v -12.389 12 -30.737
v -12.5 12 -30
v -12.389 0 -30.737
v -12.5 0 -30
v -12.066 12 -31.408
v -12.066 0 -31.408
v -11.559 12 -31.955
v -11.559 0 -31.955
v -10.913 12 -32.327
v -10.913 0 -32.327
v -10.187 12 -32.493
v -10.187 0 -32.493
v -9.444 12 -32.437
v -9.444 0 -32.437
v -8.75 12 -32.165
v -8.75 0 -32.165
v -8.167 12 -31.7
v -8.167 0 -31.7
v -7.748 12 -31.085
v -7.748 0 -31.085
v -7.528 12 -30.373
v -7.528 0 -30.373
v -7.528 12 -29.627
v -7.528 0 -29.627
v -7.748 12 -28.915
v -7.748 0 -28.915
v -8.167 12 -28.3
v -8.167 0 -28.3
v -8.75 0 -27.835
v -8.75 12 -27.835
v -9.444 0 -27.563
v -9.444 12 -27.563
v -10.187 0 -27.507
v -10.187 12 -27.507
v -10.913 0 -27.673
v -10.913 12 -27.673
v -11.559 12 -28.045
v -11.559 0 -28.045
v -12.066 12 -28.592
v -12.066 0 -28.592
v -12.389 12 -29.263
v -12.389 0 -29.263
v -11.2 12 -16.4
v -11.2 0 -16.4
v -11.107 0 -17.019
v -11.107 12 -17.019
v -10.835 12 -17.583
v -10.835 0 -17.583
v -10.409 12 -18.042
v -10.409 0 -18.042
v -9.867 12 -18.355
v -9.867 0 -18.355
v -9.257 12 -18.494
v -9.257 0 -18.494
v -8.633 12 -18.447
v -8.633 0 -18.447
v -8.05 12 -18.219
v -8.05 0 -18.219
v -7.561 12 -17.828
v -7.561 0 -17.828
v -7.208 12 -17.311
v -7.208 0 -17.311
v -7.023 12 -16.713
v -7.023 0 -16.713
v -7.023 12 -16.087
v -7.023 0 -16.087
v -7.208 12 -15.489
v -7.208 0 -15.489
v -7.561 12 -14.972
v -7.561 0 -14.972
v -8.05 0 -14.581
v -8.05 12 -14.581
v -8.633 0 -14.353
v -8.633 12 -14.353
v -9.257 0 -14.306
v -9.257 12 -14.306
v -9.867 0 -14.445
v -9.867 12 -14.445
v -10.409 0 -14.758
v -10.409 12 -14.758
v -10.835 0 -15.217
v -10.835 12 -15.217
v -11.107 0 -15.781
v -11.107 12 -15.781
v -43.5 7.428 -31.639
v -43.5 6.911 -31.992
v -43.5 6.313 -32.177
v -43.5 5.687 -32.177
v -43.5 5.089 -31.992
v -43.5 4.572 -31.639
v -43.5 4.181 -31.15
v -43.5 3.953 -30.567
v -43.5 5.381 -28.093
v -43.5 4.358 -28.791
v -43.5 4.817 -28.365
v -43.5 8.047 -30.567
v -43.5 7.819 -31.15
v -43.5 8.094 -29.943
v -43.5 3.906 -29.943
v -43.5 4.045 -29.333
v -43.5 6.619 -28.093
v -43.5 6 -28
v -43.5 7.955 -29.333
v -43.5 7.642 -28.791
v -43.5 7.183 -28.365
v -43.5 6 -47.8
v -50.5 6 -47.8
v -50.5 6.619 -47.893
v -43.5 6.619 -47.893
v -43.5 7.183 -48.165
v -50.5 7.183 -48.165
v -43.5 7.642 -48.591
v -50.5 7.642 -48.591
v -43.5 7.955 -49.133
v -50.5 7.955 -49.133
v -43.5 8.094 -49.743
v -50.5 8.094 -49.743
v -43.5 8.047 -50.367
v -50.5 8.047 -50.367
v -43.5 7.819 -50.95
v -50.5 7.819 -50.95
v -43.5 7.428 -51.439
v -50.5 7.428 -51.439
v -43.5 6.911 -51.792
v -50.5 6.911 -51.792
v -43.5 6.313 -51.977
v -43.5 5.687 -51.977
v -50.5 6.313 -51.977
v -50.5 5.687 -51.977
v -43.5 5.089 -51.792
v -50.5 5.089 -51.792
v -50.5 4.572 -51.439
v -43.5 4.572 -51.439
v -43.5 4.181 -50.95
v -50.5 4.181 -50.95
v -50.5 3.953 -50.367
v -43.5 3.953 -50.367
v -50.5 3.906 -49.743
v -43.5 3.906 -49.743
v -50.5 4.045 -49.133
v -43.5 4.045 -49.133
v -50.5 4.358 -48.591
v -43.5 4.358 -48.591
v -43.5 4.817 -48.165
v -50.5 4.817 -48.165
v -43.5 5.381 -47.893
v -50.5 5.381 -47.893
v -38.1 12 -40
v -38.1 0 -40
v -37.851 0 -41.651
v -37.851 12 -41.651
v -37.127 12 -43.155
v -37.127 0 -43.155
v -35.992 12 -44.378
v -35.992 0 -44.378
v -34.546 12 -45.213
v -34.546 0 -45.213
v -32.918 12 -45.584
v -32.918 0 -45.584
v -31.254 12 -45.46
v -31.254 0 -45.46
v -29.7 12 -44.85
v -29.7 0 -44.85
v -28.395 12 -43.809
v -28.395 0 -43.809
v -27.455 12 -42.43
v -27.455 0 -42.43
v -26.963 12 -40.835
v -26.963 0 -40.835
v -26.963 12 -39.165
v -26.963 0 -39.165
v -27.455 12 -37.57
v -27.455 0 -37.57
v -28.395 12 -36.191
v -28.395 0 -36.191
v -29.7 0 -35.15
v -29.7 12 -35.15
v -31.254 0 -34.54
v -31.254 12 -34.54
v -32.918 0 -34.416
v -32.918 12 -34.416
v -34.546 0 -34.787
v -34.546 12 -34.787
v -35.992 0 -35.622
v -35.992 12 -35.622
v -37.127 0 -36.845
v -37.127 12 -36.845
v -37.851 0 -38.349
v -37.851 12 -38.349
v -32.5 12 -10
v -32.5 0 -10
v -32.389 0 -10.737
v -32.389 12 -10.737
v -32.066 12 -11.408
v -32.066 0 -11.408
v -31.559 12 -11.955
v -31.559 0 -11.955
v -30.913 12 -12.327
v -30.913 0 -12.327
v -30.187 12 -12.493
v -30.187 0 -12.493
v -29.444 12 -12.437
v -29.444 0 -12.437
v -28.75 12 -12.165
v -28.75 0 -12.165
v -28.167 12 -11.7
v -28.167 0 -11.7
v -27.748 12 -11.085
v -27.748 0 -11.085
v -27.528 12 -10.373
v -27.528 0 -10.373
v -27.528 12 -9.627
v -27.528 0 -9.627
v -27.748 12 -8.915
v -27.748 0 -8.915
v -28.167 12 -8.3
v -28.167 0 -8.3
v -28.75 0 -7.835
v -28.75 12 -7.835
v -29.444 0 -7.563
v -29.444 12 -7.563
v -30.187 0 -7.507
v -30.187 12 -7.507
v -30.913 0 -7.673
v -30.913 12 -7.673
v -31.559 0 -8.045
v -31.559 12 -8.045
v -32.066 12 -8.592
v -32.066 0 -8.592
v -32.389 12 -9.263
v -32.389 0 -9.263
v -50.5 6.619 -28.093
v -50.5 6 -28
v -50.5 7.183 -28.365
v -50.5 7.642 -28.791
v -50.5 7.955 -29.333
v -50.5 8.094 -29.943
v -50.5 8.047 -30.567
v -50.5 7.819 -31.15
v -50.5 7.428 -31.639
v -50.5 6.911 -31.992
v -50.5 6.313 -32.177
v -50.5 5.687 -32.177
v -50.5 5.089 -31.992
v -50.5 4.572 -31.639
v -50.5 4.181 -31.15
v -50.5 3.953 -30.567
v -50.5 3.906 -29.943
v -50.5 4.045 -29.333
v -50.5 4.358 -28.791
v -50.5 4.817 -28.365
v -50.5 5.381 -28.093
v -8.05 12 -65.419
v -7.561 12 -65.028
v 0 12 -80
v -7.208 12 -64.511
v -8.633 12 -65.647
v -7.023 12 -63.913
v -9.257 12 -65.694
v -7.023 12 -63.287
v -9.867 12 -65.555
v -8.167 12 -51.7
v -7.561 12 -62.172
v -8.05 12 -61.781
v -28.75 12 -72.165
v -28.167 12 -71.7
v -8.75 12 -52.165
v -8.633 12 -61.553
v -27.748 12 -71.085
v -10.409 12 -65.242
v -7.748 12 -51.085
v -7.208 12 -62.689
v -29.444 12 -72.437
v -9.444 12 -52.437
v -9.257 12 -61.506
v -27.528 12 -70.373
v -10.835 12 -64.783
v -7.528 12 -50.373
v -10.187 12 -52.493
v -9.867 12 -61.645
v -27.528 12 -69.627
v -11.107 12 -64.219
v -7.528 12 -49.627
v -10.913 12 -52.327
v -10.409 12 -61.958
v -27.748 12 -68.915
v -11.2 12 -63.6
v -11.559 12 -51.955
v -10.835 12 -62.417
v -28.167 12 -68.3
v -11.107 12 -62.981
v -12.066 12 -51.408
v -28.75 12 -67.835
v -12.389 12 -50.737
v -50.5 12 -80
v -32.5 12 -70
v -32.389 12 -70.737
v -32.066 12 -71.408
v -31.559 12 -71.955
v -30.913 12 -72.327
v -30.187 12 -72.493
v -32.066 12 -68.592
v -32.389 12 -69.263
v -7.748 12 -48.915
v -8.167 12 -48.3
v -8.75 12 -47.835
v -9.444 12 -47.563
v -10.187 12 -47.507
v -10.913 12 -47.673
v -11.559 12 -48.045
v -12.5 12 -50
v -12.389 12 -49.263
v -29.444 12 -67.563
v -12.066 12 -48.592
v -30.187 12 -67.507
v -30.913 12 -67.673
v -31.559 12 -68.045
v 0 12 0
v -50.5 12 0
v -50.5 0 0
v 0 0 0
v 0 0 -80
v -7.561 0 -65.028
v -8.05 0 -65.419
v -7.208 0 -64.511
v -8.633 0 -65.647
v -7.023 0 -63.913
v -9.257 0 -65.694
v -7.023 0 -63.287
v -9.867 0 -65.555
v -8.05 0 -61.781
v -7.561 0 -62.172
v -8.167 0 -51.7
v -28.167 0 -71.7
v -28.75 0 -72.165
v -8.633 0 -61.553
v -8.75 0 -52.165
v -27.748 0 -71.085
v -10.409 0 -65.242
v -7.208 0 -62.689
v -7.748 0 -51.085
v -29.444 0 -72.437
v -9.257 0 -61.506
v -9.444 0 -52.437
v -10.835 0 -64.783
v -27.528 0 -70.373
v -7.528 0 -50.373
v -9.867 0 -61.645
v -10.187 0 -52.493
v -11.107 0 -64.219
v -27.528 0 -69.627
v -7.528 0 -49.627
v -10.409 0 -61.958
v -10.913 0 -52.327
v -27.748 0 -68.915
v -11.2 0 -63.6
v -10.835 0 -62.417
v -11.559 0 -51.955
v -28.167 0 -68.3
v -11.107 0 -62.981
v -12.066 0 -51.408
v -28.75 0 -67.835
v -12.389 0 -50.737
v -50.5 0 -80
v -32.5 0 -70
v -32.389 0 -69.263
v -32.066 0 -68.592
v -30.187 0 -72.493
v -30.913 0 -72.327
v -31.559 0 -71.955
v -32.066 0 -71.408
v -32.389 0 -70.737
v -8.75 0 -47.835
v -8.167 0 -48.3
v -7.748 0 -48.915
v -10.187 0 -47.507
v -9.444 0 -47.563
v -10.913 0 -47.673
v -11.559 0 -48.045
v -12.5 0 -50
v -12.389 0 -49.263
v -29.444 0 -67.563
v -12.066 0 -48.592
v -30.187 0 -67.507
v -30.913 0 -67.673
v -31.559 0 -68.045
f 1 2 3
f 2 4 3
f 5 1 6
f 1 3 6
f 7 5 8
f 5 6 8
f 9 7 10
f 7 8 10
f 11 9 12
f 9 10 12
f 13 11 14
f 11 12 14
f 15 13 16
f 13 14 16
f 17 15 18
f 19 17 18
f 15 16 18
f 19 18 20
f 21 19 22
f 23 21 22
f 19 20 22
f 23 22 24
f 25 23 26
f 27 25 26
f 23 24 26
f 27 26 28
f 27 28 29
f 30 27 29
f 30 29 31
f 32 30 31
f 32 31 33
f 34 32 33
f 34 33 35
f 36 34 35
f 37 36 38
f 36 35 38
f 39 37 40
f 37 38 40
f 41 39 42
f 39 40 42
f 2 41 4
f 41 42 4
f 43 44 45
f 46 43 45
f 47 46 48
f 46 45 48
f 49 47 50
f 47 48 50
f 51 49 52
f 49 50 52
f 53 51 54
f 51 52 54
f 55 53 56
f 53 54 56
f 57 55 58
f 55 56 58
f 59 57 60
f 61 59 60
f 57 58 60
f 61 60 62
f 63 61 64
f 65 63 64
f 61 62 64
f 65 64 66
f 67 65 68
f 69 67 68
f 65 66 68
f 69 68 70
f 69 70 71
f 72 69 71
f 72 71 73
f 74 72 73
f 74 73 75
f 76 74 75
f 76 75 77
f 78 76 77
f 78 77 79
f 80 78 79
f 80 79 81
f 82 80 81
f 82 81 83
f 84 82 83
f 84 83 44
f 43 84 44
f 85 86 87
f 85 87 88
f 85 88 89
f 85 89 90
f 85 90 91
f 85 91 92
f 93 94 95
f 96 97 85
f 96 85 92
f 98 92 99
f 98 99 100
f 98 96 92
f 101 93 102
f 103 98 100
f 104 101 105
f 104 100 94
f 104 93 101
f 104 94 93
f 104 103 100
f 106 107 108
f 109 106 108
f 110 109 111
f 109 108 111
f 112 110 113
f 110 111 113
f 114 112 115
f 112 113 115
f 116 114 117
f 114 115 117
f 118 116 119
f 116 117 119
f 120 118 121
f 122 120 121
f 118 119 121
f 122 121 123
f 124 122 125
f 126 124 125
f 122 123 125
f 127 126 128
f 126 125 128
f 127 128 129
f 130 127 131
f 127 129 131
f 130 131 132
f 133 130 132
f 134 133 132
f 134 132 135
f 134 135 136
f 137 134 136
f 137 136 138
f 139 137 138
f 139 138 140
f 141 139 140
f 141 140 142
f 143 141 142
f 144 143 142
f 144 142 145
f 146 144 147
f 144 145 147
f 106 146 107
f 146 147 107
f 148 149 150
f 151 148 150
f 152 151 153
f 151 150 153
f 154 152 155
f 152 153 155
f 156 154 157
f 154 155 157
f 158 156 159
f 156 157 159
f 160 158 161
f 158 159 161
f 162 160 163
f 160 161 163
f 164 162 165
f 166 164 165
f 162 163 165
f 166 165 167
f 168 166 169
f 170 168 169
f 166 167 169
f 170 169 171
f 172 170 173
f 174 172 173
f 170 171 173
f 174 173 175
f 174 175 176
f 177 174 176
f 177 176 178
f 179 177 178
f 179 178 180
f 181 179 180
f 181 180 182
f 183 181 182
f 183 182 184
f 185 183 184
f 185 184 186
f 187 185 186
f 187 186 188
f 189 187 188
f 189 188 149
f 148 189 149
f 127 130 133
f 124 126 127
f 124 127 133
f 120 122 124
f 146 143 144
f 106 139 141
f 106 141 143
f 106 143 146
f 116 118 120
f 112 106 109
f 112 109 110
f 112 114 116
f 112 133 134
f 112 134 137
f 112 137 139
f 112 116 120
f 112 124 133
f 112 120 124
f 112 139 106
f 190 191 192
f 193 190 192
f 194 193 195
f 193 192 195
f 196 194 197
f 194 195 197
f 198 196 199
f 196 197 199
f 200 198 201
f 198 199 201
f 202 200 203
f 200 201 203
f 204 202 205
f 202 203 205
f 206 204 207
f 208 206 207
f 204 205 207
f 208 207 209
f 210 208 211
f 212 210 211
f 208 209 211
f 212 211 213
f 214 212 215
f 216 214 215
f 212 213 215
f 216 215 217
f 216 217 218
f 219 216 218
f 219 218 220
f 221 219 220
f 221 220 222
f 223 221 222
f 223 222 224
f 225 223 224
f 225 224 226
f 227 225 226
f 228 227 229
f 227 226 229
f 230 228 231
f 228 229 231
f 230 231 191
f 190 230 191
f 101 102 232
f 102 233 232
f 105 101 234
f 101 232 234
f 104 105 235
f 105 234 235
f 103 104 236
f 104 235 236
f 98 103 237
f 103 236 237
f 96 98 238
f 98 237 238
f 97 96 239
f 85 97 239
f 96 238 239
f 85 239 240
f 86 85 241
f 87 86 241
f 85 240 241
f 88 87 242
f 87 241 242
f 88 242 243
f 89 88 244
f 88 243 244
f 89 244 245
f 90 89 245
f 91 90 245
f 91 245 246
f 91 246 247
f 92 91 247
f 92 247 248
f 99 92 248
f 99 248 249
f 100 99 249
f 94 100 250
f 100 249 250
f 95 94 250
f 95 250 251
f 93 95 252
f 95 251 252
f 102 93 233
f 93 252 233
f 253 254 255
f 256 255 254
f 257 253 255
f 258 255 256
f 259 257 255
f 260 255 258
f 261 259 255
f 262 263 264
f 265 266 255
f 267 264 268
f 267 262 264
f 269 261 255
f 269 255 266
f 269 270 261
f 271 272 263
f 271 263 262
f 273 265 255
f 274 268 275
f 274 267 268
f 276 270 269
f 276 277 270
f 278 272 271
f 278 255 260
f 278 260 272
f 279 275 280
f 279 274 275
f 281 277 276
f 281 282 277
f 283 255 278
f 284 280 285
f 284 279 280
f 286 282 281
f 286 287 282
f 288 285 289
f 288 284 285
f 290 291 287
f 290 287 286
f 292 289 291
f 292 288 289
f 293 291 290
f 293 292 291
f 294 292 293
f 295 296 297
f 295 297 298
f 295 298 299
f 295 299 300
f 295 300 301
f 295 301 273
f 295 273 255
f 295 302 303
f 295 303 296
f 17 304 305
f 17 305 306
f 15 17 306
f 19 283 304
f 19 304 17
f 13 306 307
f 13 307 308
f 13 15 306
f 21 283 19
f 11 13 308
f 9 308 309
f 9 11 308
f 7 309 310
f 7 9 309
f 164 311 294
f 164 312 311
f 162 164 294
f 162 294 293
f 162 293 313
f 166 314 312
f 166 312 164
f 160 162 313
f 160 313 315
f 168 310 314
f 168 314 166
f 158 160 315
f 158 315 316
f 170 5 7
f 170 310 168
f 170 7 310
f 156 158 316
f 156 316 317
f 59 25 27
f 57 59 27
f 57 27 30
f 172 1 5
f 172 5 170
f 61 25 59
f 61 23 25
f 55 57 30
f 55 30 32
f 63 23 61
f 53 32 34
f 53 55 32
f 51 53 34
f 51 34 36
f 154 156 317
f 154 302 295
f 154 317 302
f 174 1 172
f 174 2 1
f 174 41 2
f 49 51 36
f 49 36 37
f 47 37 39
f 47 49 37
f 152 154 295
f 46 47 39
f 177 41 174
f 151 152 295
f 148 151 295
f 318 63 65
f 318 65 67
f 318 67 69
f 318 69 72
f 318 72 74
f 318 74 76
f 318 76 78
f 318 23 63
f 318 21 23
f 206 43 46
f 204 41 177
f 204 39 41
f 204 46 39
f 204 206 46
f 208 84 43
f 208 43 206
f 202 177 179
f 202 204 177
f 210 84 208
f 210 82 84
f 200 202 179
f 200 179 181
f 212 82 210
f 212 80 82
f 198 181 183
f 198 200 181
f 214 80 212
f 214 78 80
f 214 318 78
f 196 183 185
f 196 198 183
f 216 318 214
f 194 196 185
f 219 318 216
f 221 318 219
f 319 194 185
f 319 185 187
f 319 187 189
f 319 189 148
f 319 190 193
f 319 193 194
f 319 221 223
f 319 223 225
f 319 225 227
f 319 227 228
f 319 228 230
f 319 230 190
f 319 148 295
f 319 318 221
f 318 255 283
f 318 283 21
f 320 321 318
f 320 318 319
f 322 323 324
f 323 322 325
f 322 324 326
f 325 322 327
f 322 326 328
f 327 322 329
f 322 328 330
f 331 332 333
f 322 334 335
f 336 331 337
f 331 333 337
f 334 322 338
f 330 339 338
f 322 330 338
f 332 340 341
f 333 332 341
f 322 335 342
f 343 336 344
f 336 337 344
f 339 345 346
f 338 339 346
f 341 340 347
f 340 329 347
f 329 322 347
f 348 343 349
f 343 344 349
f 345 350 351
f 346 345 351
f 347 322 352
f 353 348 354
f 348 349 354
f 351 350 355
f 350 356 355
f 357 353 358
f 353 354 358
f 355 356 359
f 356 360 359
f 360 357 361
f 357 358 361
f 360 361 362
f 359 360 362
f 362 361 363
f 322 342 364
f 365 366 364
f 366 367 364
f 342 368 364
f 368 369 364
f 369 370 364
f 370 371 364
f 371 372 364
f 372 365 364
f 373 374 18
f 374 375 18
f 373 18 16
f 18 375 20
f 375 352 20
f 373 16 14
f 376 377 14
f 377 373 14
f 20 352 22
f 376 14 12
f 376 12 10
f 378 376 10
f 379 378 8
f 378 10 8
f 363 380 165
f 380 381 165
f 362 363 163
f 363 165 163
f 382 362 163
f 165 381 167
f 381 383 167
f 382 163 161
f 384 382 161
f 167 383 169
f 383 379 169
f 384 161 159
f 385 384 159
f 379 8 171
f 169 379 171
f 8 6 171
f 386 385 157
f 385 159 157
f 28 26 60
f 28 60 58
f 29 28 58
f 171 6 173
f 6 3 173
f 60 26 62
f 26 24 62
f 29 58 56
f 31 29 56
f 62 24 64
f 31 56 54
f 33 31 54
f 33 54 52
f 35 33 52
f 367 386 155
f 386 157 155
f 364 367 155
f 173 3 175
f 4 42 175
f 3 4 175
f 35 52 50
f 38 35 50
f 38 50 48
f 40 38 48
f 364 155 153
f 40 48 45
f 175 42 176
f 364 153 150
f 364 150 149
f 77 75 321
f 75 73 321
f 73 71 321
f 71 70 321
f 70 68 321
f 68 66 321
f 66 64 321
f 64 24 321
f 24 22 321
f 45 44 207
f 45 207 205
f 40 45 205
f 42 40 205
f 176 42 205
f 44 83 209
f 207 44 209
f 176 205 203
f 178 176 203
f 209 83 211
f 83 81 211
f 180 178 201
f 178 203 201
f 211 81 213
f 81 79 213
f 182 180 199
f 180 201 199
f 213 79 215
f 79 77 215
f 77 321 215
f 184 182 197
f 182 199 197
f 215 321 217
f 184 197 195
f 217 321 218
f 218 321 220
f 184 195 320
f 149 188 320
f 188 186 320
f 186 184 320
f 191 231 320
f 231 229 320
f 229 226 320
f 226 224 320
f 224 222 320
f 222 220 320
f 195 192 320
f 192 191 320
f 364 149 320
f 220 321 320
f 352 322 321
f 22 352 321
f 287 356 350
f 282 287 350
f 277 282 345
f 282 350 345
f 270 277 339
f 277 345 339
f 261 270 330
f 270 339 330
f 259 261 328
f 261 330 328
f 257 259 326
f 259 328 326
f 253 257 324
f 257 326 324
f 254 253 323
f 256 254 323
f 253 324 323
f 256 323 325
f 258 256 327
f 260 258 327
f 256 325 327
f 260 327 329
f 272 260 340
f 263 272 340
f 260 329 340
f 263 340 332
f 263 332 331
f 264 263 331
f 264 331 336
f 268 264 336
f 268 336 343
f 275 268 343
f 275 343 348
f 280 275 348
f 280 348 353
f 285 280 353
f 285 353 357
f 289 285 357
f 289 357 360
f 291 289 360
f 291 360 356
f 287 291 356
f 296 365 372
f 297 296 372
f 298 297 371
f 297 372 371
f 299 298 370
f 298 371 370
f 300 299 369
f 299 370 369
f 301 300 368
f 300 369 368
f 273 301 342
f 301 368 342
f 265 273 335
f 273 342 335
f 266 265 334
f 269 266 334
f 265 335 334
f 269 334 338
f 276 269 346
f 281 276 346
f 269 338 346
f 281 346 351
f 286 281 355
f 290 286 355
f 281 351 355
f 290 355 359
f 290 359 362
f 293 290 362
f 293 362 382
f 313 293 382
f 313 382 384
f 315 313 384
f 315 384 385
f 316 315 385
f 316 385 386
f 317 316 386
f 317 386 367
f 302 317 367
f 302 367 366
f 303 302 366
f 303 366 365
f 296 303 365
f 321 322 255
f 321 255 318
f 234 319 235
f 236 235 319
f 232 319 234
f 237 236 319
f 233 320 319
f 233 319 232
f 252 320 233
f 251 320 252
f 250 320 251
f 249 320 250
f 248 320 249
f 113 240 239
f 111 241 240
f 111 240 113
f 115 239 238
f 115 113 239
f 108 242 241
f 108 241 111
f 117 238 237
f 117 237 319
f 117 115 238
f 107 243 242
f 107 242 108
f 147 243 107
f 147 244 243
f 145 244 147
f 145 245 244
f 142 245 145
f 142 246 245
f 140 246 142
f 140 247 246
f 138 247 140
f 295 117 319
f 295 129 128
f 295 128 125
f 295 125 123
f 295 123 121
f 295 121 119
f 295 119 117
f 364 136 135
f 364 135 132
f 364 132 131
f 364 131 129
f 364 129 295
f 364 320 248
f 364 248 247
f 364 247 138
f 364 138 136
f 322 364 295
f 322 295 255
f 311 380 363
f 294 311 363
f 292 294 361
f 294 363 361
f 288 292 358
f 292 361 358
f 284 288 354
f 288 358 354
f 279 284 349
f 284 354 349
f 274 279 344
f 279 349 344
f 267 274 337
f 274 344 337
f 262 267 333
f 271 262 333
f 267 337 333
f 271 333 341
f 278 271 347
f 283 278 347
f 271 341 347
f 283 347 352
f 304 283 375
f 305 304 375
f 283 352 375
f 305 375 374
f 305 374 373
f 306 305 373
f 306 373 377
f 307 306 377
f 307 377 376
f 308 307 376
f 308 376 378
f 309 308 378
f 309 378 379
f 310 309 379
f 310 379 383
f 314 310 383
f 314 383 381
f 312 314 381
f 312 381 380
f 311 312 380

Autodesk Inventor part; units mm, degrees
ref_plane "YZ Plane" through (0, 0, 0) normal (1, 0, 0) x (0, 1, 0)
ref_plane "XZ Plane" through (0, 0, 0) normal (0, 1, 0) x (-1, 0, 0)
ref_plane "XY Plane" through (0, 0, 0) normal (0, 0, 1) x (1, 0, 0)
sketch "Sketch1" plane through (0, 0, 0) normal (0, 1, 0) x (-1, 0, 0)
  line L0 (0, 0) -> (50.5, 0)
  line L1 (50.5, 0) -> (50.5, -80)
  line L2 (50.5, -80) -> (0, -80)
  line L3 (0, -80) -> (0, 0)
  line L4 (0, -80) -> (9.1, -80)
  line L5 (0, -80) -> (10, -80)
  line L6 (10, -80) -> (10, -50)
  circle A0 centre (10, -30) radius 2.5
  circle A1 centre (10, -50) radius 2.5
  line L7 (9.1, -65.7) -> (9.1, -63.6)
  circle A2 centre (9.1, -16.4) radius 2.1
  circle A3 centre (9.1, -63.6) radius 2.1
  line L8 (0, 0) -> (0, -40)
  line L9 (9.1, -40) -> (32.5, -40)
  circle A4 centre (32.5, -40) radius 5.6
  line L10 (0, 0) -> (0, -10)
  line L11 (30, -10) -> (30, -70)
  circle A5 centre (30, -10) radius 2.5
  circle A6 centre (30, -70) radius 2.5
  line L12 (27.5, -10) -> (30, -10)
  line L13 (9.1, 0) -> (9.1, -10)
  line L14 (9.1, -14.3) -> (9.1, -16.4)
  line L15 (9.1, -10) -> (9.1, 0)
  line L16 (9.1, -18.5) -> (9.1, -14.3)
  line L17 (10, -18.2974) -> (10, -14.5026)
  line L18 (10, -50) -> (10, -47.5)
  line L19 (10, -32.5) -> (10, -30)
  line L20 (9.1, -32.3324) -> (9.1, -27.6676)
  line L21 (10, -80) -> (10, -47.5)
  line L22 (10, -40) -> (10, -27.5)
  line L23 (9.1, -65.7) -> (9.1, -61.5)
  line L24 (9.1, -52.3324) -> (9.1, -47.6676)
  dimension "d17" = 5
  dimension "d0" = 50.5
  dimension "d1" = 80
  dimension "d2" = 9.1
  dimension "d3" = 10
  dimension "d4" = 30
  dimension "d5" = 20
  dimension "d6" = 5
  dimension "d7" = 5
  dimension "d8" = 16.4
  dimension "d9" = 16.4
  dimension "d10" = 4.2
  dimension "d11" = 4.2
  dimension "d12" = 32.5
  dimension "d13" = 11.2
  dimension "d14" = 10
  dimension "d15" = 30
  dimension "d16" = 60
  dimension "d27" = 47.2
extrude "Extrusion1" add sketch "Sketch1" along normal blind 12
sketch "Sketch2" plane through (-50.5, 0, -80) normal (-1, 0, 0) x (0, 0, 1)
  line L0 (80, 0) -> (80, 12) projected
  line L1 (80, 0) -> (40, 0)
  line L2 (0, 0) -> (80, 0) projected
  line L3 (40, 0) -> (49.9, 0)
  line L4 (49.9, 0) -> (30.1, 0)
  line L5 (30.1, 0) -> (30.1, 6)
  line L6 (30.1, 6) -> (49.9, 6)
  circle A0 centre (49.9, 6) radius 2.1
  circle A1 centre (30.1, 6) radius 2.1
  dimension "d20" = 9.9
  dimension "d21" = 19.8
  dimension "d22" = 6
  dimension "d23" = 4.2
  dimension "d24" = 4.2
extrude "Extrusion2" cut sketch "Sketch2" against normal blind 7
sketch "Sketch3" plane through (-50.5, 0, -80) normal (-1, 0, 0) x (0, 0, 1)
  circle A0 centre (30.1, 6) radius 2.1 projected
  circle A1 centre (49.9, 6) radius 2.1 projected
  line L0 (0, 0) -> (80, 0) projected
  line L1 (80, 0) -> (80, 12) projected
  line L2 (0, 12) -> (80, 12) projected
  line L3 (0, 0) -> (0, 12) projected
properties part number "tapaperfil"
